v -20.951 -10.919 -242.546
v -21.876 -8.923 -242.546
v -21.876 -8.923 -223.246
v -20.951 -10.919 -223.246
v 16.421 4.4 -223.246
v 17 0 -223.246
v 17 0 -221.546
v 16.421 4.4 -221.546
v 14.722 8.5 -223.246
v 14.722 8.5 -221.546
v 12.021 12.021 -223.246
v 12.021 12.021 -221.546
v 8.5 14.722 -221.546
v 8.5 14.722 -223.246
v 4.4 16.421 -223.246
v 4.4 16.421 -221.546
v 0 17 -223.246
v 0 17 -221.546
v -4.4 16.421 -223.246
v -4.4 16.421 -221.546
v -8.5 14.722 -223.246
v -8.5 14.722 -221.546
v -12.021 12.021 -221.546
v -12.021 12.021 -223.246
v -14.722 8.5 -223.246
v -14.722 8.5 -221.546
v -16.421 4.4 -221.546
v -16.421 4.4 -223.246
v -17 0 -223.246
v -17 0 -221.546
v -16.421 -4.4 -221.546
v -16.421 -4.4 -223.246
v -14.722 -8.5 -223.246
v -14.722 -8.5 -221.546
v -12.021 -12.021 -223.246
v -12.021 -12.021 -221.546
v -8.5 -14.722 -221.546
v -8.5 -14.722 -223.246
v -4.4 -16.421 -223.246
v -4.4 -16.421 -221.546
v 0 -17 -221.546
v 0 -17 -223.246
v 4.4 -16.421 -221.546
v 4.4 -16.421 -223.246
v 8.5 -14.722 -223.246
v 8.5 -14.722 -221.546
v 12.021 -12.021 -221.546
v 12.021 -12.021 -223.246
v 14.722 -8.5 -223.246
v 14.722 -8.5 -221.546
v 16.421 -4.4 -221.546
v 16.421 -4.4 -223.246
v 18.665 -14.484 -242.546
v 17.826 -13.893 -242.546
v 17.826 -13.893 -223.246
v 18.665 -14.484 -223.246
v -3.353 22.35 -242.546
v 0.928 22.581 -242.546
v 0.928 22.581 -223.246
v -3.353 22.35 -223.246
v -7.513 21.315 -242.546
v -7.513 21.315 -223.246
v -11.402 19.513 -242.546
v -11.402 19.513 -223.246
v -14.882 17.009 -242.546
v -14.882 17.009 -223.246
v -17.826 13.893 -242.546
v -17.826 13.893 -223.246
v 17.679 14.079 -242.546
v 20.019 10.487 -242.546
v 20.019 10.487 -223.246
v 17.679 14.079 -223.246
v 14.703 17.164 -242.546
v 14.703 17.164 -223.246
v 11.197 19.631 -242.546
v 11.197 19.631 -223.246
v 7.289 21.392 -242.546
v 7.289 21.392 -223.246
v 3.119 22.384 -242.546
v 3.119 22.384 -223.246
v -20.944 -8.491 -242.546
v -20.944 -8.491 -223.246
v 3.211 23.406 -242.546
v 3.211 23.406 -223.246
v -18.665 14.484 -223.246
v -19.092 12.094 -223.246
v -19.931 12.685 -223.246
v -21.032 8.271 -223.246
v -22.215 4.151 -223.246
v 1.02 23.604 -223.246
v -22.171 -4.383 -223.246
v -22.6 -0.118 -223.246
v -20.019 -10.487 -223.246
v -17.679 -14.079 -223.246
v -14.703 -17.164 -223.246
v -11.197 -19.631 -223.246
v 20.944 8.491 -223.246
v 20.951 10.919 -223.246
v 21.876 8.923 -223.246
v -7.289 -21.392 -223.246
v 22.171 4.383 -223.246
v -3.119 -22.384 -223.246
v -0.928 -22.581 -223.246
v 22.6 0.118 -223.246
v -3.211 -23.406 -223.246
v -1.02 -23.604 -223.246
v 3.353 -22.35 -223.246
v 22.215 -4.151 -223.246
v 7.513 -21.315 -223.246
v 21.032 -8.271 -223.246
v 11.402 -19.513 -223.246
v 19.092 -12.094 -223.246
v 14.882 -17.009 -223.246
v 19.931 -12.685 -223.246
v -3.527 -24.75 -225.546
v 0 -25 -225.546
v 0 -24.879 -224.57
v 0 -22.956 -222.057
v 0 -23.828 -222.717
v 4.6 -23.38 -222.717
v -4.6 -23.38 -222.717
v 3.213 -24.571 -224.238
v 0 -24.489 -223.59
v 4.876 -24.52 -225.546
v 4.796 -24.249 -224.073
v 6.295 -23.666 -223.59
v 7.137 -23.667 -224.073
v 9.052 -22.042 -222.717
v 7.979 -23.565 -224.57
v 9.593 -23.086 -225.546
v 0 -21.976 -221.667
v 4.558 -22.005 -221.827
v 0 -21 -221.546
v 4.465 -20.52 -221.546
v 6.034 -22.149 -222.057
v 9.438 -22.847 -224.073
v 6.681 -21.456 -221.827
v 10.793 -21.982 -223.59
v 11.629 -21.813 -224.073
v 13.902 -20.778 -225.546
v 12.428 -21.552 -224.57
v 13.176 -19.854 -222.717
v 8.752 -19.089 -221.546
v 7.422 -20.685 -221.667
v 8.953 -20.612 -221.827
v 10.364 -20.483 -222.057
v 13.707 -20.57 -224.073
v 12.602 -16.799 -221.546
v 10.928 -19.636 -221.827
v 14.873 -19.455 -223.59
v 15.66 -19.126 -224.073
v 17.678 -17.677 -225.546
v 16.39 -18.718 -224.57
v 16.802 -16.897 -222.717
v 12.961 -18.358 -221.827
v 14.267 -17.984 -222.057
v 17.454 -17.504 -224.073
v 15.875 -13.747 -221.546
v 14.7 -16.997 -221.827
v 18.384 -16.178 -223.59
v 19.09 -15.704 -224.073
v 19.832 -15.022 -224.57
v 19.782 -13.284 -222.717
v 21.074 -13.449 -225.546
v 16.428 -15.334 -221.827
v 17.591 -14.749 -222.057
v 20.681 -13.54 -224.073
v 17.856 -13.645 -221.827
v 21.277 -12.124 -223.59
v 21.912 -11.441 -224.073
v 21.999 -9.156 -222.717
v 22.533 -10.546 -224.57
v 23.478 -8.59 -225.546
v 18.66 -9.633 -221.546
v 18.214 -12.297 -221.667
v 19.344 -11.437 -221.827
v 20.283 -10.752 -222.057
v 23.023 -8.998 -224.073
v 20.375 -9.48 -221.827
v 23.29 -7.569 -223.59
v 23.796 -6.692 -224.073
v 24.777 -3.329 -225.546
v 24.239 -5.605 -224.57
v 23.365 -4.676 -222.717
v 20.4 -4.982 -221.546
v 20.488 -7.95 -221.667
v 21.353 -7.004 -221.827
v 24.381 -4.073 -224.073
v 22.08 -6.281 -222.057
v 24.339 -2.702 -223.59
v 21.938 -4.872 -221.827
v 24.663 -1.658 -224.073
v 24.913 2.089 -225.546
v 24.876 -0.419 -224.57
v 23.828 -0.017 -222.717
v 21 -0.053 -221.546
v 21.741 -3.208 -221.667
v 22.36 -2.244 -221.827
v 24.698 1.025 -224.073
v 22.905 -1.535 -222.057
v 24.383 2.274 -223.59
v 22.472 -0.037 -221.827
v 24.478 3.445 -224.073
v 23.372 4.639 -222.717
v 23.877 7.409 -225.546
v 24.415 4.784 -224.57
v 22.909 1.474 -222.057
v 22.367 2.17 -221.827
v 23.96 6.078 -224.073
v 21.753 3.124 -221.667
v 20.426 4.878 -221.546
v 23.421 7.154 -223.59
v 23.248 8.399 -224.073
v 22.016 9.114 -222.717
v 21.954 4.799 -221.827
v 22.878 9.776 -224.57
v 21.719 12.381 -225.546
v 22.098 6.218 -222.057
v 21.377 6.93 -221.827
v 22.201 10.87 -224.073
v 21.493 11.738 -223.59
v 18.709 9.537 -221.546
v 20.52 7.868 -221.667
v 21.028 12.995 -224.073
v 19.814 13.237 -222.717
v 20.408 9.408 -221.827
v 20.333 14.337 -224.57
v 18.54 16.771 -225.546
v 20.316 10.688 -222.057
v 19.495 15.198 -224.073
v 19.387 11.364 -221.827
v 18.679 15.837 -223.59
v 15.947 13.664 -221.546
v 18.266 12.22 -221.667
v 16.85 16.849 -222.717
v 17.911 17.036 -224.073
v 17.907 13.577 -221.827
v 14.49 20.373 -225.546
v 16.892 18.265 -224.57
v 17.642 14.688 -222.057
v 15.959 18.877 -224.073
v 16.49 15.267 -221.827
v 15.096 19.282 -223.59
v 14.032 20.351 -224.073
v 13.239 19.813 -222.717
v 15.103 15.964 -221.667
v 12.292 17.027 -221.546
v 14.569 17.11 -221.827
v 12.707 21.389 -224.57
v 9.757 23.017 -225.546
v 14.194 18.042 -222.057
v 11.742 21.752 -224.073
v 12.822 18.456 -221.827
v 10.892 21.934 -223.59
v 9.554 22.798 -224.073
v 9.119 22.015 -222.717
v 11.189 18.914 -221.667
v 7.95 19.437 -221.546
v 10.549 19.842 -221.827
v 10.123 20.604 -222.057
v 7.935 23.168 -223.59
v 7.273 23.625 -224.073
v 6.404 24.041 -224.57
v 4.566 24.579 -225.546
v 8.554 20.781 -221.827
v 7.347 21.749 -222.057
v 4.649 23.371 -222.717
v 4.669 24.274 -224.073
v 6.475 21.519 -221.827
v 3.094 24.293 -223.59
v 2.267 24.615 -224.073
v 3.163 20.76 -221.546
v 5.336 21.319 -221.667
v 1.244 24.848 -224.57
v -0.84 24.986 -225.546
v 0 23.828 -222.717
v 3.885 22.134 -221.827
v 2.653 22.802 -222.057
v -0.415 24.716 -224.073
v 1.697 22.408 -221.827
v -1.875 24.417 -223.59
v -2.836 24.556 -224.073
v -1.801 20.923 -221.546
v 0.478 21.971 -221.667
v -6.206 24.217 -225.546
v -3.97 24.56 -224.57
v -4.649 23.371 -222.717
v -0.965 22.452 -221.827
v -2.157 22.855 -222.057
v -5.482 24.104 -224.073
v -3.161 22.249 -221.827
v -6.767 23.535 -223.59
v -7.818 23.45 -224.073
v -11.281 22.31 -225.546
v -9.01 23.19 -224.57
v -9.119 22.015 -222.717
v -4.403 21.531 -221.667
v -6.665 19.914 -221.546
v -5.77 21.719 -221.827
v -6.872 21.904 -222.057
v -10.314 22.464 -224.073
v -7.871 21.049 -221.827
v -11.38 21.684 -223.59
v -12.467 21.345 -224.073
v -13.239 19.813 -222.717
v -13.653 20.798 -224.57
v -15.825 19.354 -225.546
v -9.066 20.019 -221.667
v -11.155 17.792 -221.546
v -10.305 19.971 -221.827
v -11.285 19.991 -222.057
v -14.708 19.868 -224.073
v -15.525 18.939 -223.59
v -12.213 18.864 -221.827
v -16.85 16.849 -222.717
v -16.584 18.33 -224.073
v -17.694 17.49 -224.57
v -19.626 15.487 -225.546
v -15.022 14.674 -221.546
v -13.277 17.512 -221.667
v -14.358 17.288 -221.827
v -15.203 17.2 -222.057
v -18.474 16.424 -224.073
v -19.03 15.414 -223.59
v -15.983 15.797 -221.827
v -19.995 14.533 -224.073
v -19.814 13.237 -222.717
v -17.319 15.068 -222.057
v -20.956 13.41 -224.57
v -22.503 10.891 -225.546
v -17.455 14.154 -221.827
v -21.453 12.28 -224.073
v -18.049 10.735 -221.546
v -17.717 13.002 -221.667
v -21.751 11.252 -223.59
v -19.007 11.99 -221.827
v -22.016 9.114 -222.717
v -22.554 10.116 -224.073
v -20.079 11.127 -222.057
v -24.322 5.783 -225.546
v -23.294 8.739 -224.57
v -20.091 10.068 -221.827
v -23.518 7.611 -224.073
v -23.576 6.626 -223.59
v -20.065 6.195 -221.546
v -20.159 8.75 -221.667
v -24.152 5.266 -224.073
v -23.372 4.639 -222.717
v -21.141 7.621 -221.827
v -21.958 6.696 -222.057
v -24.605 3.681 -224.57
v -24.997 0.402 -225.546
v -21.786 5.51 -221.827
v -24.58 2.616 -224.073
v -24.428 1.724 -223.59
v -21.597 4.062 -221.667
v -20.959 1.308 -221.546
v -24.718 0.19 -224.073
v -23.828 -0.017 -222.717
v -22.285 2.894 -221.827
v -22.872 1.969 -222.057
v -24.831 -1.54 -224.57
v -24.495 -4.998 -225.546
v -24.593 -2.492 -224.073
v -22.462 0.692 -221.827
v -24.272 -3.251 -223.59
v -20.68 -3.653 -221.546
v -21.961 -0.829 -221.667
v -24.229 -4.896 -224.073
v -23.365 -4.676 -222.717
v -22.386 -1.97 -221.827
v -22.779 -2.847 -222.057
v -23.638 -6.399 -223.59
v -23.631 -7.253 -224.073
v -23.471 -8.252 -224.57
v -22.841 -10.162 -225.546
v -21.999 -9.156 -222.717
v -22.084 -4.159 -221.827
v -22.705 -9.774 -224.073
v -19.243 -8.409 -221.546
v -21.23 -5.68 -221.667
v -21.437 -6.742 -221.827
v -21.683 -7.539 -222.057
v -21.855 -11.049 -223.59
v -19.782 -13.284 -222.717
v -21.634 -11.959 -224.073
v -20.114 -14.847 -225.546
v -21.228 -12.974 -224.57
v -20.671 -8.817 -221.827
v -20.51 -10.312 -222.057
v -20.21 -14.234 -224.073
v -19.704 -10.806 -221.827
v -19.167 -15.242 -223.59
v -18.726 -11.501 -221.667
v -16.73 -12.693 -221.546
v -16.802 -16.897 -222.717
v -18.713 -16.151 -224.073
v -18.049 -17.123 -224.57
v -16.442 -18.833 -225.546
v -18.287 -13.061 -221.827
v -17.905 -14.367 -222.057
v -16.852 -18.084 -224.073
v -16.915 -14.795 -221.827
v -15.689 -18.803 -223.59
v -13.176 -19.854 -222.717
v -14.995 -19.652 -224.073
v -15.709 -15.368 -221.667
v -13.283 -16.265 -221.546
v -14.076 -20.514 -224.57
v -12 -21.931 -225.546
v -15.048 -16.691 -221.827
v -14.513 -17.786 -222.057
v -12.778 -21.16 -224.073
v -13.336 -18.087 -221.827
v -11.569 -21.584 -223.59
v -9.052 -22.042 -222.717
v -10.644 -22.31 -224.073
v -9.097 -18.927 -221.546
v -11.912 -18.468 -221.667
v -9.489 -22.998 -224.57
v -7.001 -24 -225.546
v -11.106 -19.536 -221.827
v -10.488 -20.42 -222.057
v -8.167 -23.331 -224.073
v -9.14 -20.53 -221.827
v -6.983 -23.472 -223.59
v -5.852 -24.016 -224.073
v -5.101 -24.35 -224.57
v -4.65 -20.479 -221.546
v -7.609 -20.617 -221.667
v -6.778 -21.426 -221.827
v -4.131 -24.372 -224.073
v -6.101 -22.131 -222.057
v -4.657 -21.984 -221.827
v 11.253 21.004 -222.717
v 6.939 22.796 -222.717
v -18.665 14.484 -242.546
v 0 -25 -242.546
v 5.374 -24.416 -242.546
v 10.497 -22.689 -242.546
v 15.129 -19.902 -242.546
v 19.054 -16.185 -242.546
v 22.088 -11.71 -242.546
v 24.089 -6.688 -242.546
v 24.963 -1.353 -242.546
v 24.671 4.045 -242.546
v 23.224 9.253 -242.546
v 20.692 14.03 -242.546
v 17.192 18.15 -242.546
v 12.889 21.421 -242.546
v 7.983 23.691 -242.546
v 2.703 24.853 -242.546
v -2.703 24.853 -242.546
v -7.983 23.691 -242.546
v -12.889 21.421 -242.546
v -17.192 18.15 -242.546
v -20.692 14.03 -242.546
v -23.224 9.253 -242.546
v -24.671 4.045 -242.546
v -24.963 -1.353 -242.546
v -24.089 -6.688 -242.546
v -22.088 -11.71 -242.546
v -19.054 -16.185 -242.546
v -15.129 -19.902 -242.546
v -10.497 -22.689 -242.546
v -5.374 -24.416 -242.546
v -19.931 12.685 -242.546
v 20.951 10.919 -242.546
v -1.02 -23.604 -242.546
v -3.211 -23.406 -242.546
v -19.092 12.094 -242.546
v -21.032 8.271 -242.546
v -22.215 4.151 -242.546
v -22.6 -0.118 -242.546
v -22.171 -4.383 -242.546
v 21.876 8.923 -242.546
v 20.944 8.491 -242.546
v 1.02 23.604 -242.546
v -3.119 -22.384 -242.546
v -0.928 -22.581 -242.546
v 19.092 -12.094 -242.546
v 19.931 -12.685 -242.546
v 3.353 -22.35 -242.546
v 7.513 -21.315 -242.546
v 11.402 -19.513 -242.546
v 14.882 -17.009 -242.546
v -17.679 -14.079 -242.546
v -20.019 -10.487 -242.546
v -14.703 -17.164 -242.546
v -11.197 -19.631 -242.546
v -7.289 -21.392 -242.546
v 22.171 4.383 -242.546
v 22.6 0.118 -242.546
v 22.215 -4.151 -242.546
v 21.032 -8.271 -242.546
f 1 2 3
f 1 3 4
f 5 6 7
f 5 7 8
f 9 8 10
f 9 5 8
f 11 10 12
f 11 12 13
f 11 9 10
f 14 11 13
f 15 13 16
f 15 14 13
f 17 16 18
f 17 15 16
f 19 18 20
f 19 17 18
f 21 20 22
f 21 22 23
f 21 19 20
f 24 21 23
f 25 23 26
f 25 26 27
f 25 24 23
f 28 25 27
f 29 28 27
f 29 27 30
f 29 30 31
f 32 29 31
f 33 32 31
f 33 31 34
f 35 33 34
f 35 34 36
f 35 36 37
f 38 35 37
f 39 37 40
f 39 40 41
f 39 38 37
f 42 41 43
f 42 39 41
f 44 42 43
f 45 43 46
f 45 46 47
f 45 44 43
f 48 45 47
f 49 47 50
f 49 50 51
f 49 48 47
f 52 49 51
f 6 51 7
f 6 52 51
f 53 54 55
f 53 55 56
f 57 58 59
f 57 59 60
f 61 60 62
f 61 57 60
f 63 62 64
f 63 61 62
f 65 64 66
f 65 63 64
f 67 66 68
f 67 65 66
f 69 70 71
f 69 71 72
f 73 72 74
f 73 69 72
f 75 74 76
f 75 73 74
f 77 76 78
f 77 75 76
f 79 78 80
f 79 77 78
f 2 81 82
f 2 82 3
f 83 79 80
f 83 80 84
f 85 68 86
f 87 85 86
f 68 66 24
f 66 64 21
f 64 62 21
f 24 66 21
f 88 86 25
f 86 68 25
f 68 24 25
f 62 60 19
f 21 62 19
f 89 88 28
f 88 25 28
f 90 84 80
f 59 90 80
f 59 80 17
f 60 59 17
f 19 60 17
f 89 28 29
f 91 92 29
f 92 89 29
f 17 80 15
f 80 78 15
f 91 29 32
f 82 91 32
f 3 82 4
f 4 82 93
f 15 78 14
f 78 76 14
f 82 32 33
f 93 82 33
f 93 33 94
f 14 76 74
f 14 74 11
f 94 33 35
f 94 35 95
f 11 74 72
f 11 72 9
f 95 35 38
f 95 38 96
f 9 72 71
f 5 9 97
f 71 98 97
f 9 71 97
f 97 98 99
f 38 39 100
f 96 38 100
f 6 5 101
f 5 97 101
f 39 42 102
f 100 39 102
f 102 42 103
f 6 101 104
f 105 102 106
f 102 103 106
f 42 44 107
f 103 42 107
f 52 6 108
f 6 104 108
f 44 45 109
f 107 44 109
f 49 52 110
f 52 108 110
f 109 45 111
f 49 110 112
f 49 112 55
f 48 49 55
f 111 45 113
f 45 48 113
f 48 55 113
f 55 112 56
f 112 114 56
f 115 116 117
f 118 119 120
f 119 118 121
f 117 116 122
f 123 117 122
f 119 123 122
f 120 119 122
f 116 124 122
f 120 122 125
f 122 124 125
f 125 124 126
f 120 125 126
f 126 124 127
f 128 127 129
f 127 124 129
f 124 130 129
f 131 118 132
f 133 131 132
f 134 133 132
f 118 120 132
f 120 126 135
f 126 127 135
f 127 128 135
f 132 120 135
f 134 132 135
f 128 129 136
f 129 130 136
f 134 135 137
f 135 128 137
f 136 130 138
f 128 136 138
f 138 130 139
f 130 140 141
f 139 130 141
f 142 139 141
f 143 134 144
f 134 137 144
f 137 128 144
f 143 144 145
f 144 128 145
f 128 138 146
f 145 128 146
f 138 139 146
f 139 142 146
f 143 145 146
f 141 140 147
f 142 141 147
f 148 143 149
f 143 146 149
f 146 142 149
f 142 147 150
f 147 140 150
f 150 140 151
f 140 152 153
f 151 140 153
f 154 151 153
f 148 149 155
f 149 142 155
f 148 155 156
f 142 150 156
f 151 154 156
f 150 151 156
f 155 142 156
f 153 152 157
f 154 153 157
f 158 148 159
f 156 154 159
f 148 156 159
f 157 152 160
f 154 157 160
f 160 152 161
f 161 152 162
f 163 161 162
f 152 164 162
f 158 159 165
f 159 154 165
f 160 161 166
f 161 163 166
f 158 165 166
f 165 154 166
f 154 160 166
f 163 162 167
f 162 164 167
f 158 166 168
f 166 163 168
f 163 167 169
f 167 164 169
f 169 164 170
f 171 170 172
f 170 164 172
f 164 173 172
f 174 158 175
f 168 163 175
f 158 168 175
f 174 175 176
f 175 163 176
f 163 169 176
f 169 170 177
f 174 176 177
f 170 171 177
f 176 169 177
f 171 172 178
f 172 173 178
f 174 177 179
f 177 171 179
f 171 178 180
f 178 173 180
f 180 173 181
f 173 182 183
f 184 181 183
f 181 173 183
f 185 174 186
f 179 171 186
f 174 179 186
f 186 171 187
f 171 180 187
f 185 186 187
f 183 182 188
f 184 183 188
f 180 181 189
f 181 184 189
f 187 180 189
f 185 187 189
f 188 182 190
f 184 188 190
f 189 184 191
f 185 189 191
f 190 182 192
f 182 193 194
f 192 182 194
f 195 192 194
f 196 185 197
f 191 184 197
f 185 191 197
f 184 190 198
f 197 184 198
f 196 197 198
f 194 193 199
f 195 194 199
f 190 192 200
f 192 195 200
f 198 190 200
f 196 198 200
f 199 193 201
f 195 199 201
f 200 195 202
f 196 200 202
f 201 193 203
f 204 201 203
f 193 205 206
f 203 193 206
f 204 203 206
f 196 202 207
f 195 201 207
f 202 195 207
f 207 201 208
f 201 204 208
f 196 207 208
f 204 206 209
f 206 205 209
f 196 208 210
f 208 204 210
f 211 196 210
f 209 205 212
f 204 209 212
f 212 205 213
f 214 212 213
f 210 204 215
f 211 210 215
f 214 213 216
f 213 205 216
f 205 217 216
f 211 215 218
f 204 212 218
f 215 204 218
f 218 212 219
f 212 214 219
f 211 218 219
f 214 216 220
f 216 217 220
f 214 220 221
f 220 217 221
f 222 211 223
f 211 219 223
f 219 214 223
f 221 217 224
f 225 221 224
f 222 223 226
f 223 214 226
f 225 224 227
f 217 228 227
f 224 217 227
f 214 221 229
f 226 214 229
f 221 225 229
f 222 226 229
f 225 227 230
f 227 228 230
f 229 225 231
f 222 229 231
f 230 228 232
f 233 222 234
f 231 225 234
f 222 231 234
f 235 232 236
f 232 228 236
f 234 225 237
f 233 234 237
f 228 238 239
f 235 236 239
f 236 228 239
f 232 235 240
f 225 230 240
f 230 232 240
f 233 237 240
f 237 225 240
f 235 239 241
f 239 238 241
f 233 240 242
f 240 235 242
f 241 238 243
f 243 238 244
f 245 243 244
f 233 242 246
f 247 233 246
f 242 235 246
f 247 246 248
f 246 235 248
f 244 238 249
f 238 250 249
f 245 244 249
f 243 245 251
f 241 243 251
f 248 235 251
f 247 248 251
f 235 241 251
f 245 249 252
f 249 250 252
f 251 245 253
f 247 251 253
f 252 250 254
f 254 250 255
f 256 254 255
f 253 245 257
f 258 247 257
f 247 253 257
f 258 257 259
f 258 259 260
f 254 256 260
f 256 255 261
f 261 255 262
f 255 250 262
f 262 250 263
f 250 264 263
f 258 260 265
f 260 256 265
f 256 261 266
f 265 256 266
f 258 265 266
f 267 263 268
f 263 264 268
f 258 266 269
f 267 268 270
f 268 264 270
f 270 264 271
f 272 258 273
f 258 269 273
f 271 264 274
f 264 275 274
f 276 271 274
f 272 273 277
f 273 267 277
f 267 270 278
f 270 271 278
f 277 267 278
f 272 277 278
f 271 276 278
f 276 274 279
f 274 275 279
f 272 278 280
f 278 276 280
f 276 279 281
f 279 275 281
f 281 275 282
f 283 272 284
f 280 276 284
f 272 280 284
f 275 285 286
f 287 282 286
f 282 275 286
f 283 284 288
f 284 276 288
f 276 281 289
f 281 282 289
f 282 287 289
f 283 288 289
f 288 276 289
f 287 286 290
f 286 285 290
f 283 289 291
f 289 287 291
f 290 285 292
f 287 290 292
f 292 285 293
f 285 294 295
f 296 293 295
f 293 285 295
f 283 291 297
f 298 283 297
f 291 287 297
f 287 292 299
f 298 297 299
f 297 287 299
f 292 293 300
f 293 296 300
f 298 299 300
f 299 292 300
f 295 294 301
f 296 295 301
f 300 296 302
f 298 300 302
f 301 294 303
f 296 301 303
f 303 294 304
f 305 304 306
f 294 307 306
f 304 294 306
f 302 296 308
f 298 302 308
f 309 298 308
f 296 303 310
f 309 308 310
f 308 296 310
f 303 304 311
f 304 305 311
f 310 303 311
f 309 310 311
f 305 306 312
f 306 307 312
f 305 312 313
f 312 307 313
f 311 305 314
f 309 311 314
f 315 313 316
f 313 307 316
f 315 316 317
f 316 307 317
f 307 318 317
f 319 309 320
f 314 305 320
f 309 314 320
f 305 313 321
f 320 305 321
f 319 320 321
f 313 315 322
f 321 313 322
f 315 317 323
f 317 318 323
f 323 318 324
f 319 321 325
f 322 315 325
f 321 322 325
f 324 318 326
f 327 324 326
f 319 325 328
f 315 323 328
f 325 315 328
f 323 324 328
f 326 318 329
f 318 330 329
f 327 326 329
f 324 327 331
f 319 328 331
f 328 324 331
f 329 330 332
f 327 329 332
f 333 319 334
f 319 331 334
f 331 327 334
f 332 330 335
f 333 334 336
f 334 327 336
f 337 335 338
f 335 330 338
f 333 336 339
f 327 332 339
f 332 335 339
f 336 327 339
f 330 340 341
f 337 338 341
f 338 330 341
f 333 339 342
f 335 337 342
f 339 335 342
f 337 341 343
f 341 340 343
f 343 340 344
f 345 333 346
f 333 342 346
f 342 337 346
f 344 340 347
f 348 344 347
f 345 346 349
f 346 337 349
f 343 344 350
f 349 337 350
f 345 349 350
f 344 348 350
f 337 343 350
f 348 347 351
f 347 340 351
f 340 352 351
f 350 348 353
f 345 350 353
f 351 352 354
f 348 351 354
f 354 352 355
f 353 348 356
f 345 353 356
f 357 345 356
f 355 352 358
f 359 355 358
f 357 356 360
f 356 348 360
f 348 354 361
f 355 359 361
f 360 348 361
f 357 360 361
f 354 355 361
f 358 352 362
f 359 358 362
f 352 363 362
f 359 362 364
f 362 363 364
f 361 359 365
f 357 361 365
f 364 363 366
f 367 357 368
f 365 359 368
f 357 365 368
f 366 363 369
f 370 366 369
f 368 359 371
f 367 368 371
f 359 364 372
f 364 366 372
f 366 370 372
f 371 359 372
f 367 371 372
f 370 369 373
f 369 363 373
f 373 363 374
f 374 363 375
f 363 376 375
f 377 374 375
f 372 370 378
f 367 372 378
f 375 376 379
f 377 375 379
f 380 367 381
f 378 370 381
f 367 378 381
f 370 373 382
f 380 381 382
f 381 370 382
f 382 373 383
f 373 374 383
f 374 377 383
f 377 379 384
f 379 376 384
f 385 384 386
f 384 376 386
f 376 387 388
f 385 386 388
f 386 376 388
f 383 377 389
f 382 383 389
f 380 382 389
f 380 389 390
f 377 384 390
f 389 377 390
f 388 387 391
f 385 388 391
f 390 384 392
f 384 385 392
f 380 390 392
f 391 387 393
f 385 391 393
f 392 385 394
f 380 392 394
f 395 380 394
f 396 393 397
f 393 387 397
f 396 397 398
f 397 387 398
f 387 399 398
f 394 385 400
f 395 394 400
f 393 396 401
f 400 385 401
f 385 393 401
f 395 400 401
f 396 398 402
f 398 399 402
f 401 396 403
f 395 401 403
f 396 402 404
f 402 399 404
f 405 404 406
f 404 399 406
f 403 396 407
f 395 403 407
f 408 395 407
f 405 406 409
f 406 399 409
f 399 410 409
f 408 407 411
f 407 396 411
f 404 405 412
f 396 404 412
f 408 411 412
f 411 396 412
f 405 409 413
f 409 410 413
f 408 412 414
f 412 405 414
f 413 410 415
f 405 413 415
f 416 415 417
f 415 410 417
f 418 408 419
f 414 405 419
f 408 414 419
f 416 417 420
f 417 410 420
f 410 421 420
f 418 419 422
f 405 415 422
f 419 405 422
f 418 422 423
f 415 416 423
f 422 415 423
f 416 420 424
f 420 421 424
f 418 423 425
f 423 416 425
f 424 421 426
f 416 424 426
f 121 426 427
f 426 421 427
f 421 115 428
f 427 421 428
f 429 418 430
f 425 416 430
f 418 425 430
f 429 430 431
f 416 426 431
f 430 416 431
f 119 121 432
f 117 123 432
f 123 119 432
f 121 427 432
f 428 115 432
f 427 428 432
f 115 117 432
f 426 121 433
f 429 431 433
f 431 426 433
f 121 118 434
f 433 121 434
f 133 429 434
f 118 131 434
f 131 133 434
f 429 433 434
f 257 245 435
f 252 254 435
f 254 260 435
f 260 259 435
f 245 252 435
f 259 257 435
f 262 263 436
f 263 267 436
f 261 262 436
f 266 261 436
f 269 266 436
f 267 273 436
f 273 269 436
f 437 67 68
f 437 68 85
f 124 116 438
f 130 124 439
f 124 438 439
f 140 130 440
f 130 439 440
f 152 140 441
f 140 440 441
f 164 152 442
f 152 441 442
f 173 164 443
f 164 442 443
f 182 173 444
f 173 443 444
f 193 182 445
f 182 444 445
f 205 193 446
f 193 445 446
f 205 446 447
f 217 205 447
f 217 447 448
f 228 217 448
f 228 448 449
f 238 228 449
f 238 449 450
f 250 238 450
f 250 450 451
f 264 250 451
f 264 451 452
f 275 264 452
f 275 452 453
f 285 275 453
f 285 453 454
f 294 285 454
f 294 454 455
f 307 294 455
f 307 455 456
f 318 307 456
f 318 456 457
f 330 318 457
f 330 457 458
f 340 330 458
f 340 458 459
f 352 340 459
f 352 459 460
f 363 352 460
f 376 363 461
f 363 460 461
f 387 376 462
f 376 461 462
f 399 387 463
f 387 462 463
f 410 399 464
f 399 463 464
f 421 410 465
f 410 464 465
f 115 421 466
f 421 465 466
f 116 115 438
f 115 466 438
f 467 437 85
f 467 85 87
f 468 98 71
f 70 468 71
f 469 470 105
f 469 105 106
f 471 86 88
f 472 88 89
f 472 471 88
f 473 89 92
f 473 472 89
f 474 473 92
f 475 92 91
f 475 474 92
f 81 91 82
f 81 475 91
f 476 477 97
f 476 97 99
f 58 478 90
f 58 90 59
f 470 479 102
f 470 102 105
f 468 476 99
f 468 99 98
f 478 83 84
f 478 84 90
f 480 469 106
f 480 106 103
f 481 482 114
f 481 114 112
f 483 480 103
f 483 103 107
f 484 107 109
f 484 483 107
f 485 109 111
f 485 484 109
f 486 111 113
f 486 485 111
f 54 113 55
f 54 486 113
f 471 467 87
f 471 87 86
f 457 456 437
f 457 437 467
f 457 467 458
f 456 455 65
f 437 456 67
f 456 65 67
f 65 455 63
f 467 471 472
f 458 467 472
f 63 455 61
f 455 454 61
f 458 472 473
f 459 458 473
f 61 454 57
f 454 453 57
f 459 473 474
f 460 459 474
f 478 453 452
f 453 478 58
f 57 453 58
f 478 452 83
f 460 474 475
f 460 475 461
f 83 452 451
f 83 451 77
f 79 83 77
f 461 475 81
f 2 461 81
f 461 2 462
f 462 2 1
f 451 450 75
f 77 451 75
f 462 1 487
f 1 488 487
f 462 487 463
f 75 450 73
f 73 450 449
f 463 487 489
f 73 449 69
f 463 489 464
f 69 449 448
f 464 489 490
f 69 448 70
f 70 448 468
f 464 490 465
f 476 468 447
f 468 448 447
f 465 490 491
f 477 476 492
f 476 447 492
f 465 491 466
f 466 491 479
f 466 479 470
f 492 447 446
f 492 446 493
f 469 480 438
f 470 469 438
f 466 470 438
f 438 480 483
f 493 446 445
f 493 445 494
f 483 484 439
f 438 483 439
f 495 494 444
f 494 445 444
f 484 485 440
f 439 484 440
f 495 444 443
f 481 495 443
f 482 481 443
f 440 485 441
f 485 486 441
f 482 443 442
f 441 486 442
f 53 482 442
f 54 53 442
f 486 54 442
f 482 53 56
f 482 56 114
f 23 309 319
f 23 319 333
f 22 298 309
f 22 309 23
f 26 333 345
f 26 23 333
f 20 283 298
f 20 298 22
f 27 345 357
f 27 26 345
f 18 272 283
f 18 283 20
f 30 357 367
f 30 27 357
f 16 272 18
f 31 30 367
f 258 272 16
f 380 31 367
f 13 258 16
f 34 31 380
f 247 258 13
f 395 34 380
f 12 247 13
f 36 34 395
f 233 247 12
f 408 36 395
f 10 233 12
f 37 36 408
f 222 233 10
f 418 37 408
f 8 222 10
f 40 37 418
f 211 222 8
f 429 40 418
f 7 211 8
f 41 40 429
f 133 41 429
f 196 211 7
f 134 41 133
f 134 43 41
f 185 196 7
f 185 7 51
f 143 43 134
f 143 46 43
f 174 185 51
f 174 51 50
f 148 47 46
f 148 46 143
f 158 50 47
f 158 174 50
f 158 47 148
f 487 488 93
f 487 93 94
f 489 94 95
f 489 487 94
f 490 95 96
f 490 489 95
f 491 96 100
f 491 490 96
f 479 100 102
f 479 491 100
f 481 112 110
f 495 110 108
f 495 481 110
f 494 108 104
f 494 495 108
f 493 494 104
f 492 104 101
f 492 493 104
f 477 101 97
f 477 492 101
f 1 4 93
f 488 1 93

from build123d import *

# Parameters (mm, degrees)
BOSS_EXTRUDE1_START = -242.545742
SKETCH1_R           = 25
BOSS_EXTRUDE1_DEPTH = 21.000001
BOSS_EXTRUDE2_START = -1.7
SKETCH4_R           = 25
SKETCH4_R_2         = 17
BOSS_EXTRUDE2_DEPTH = 1.7
FILLET1_R           = 4


with BuildPart() as part:
    # Sketch1 → Boss-Extrude1 (new body)
    with BuildSketch(Plane.XY.offset(BOSS_EXTRUDE1_START)):
        with Locations(Location((0, 0, 0), (0, 0, 270))):
            Circle(SKETCH1_R)
        with BuildLine():
            Line((-21.875959298, -8.922578372), (-20.951151281, -10.918757254))
            Line((-20.951151281, -10.918757254), (-20.019493054, -10.487130107))
            ThreePointArc((-20.019493054, -10.487130107), (-13.008740953, -18.480602231), (-3.118771073, -22.383772403))
            Line((-3.118771073, -22.383772403), (-3.210800112, -23.40642567))
            Line((-3.210800112, -23.40642567), (-1.019654481, -23.603607875))
            Line((-1.019654481, -23.603607875), (-0.927625442, -22.580954609))
            ThreePointArc((-0.927625442, -22.580954609), (9.500300533, -20.506201252), (17.825529997, -13.892821179))
            Line((17.825529997, -13.892821179), (18.665159186, -14.483847298))
            Line((18.665159186, -14.483847298), (19.931496801, -12.684850621))
            Line((19.931496801, -12.684850621), (19.091867612, -12.093824502))
            ThreePointArc((19.091867612, -12.093824502), (22.509041486, -2.025599021), (20.94430107, 8.490951224))
            Line((20.94430107, 8.490951224), (21.875959298, 8.922578372))
            Line((21.875959298, 8.922578372), (20.951151281, 10.918757254))
            Line((20.951151281, 10.918757254), (20.019493054, 10.487130107))
            ThreePointArc((20.019493054, 10.487130107), (13.008740953, 18.480602231), (3.118771073, 22.383772403))
            Line((3.118771073, 22.383772403), (3.210800112, 23.40642567))
            Line((3.210800112, 23.40642567), (1.019654481, 23.603607875))
            Line((1.019654481, 23.603607875), (0.927625442, 22.580954609))
            ThreePointArc((0.927625442, 22.580954609), (-9.500300533, 20.506201252), (-17.825529997, 13.892821179))
            Line((-17.825529997, 13.892821179), (-18.665159186, 14.483847298))
            Line((-18.665159186, 14.483847298), (-19.931496801, 12.684850621))
            Line((-19.931496801, 12.684850621), (-19.091867612, 12.093824502))
            ThreePointArc((-19.091867612, 12.093824502), (-22.509041486, 2.025599021), (-20.94430107, -8.490951224))
            Line((-20.94430107, -8.490951224), (-21.875959298, -8.922578372))
        make_face(mode=Mode.SUBTRACT)
    extrude(amount=BOSS_EXTRUDE1_DEPTH)

    # Sketch4 → Boss-Extrude2 (add)
    with BuildSketch(Plane.XY.offset(-221.545741472).offset(BOSS_EXTRUDE2_START)):
        with Locations(Location((0, 0, 0), (0, 0, 270))):
            Circle(SKETCH4_R)
        Circle(SKETCH4_R_2, mode=Mode.SUBTRACT)
    extrude(amount=BOSS_EXTRUDE2_DEPTH)

    # Fillet1
    fillet1_edges = [part.edges().sort_by_distance(p)[0] for p in [
        (0, 25, -221.545741),
    ]]
    fillet(fillet1_edges, radius=FILLET1_R)


solid = part.part
